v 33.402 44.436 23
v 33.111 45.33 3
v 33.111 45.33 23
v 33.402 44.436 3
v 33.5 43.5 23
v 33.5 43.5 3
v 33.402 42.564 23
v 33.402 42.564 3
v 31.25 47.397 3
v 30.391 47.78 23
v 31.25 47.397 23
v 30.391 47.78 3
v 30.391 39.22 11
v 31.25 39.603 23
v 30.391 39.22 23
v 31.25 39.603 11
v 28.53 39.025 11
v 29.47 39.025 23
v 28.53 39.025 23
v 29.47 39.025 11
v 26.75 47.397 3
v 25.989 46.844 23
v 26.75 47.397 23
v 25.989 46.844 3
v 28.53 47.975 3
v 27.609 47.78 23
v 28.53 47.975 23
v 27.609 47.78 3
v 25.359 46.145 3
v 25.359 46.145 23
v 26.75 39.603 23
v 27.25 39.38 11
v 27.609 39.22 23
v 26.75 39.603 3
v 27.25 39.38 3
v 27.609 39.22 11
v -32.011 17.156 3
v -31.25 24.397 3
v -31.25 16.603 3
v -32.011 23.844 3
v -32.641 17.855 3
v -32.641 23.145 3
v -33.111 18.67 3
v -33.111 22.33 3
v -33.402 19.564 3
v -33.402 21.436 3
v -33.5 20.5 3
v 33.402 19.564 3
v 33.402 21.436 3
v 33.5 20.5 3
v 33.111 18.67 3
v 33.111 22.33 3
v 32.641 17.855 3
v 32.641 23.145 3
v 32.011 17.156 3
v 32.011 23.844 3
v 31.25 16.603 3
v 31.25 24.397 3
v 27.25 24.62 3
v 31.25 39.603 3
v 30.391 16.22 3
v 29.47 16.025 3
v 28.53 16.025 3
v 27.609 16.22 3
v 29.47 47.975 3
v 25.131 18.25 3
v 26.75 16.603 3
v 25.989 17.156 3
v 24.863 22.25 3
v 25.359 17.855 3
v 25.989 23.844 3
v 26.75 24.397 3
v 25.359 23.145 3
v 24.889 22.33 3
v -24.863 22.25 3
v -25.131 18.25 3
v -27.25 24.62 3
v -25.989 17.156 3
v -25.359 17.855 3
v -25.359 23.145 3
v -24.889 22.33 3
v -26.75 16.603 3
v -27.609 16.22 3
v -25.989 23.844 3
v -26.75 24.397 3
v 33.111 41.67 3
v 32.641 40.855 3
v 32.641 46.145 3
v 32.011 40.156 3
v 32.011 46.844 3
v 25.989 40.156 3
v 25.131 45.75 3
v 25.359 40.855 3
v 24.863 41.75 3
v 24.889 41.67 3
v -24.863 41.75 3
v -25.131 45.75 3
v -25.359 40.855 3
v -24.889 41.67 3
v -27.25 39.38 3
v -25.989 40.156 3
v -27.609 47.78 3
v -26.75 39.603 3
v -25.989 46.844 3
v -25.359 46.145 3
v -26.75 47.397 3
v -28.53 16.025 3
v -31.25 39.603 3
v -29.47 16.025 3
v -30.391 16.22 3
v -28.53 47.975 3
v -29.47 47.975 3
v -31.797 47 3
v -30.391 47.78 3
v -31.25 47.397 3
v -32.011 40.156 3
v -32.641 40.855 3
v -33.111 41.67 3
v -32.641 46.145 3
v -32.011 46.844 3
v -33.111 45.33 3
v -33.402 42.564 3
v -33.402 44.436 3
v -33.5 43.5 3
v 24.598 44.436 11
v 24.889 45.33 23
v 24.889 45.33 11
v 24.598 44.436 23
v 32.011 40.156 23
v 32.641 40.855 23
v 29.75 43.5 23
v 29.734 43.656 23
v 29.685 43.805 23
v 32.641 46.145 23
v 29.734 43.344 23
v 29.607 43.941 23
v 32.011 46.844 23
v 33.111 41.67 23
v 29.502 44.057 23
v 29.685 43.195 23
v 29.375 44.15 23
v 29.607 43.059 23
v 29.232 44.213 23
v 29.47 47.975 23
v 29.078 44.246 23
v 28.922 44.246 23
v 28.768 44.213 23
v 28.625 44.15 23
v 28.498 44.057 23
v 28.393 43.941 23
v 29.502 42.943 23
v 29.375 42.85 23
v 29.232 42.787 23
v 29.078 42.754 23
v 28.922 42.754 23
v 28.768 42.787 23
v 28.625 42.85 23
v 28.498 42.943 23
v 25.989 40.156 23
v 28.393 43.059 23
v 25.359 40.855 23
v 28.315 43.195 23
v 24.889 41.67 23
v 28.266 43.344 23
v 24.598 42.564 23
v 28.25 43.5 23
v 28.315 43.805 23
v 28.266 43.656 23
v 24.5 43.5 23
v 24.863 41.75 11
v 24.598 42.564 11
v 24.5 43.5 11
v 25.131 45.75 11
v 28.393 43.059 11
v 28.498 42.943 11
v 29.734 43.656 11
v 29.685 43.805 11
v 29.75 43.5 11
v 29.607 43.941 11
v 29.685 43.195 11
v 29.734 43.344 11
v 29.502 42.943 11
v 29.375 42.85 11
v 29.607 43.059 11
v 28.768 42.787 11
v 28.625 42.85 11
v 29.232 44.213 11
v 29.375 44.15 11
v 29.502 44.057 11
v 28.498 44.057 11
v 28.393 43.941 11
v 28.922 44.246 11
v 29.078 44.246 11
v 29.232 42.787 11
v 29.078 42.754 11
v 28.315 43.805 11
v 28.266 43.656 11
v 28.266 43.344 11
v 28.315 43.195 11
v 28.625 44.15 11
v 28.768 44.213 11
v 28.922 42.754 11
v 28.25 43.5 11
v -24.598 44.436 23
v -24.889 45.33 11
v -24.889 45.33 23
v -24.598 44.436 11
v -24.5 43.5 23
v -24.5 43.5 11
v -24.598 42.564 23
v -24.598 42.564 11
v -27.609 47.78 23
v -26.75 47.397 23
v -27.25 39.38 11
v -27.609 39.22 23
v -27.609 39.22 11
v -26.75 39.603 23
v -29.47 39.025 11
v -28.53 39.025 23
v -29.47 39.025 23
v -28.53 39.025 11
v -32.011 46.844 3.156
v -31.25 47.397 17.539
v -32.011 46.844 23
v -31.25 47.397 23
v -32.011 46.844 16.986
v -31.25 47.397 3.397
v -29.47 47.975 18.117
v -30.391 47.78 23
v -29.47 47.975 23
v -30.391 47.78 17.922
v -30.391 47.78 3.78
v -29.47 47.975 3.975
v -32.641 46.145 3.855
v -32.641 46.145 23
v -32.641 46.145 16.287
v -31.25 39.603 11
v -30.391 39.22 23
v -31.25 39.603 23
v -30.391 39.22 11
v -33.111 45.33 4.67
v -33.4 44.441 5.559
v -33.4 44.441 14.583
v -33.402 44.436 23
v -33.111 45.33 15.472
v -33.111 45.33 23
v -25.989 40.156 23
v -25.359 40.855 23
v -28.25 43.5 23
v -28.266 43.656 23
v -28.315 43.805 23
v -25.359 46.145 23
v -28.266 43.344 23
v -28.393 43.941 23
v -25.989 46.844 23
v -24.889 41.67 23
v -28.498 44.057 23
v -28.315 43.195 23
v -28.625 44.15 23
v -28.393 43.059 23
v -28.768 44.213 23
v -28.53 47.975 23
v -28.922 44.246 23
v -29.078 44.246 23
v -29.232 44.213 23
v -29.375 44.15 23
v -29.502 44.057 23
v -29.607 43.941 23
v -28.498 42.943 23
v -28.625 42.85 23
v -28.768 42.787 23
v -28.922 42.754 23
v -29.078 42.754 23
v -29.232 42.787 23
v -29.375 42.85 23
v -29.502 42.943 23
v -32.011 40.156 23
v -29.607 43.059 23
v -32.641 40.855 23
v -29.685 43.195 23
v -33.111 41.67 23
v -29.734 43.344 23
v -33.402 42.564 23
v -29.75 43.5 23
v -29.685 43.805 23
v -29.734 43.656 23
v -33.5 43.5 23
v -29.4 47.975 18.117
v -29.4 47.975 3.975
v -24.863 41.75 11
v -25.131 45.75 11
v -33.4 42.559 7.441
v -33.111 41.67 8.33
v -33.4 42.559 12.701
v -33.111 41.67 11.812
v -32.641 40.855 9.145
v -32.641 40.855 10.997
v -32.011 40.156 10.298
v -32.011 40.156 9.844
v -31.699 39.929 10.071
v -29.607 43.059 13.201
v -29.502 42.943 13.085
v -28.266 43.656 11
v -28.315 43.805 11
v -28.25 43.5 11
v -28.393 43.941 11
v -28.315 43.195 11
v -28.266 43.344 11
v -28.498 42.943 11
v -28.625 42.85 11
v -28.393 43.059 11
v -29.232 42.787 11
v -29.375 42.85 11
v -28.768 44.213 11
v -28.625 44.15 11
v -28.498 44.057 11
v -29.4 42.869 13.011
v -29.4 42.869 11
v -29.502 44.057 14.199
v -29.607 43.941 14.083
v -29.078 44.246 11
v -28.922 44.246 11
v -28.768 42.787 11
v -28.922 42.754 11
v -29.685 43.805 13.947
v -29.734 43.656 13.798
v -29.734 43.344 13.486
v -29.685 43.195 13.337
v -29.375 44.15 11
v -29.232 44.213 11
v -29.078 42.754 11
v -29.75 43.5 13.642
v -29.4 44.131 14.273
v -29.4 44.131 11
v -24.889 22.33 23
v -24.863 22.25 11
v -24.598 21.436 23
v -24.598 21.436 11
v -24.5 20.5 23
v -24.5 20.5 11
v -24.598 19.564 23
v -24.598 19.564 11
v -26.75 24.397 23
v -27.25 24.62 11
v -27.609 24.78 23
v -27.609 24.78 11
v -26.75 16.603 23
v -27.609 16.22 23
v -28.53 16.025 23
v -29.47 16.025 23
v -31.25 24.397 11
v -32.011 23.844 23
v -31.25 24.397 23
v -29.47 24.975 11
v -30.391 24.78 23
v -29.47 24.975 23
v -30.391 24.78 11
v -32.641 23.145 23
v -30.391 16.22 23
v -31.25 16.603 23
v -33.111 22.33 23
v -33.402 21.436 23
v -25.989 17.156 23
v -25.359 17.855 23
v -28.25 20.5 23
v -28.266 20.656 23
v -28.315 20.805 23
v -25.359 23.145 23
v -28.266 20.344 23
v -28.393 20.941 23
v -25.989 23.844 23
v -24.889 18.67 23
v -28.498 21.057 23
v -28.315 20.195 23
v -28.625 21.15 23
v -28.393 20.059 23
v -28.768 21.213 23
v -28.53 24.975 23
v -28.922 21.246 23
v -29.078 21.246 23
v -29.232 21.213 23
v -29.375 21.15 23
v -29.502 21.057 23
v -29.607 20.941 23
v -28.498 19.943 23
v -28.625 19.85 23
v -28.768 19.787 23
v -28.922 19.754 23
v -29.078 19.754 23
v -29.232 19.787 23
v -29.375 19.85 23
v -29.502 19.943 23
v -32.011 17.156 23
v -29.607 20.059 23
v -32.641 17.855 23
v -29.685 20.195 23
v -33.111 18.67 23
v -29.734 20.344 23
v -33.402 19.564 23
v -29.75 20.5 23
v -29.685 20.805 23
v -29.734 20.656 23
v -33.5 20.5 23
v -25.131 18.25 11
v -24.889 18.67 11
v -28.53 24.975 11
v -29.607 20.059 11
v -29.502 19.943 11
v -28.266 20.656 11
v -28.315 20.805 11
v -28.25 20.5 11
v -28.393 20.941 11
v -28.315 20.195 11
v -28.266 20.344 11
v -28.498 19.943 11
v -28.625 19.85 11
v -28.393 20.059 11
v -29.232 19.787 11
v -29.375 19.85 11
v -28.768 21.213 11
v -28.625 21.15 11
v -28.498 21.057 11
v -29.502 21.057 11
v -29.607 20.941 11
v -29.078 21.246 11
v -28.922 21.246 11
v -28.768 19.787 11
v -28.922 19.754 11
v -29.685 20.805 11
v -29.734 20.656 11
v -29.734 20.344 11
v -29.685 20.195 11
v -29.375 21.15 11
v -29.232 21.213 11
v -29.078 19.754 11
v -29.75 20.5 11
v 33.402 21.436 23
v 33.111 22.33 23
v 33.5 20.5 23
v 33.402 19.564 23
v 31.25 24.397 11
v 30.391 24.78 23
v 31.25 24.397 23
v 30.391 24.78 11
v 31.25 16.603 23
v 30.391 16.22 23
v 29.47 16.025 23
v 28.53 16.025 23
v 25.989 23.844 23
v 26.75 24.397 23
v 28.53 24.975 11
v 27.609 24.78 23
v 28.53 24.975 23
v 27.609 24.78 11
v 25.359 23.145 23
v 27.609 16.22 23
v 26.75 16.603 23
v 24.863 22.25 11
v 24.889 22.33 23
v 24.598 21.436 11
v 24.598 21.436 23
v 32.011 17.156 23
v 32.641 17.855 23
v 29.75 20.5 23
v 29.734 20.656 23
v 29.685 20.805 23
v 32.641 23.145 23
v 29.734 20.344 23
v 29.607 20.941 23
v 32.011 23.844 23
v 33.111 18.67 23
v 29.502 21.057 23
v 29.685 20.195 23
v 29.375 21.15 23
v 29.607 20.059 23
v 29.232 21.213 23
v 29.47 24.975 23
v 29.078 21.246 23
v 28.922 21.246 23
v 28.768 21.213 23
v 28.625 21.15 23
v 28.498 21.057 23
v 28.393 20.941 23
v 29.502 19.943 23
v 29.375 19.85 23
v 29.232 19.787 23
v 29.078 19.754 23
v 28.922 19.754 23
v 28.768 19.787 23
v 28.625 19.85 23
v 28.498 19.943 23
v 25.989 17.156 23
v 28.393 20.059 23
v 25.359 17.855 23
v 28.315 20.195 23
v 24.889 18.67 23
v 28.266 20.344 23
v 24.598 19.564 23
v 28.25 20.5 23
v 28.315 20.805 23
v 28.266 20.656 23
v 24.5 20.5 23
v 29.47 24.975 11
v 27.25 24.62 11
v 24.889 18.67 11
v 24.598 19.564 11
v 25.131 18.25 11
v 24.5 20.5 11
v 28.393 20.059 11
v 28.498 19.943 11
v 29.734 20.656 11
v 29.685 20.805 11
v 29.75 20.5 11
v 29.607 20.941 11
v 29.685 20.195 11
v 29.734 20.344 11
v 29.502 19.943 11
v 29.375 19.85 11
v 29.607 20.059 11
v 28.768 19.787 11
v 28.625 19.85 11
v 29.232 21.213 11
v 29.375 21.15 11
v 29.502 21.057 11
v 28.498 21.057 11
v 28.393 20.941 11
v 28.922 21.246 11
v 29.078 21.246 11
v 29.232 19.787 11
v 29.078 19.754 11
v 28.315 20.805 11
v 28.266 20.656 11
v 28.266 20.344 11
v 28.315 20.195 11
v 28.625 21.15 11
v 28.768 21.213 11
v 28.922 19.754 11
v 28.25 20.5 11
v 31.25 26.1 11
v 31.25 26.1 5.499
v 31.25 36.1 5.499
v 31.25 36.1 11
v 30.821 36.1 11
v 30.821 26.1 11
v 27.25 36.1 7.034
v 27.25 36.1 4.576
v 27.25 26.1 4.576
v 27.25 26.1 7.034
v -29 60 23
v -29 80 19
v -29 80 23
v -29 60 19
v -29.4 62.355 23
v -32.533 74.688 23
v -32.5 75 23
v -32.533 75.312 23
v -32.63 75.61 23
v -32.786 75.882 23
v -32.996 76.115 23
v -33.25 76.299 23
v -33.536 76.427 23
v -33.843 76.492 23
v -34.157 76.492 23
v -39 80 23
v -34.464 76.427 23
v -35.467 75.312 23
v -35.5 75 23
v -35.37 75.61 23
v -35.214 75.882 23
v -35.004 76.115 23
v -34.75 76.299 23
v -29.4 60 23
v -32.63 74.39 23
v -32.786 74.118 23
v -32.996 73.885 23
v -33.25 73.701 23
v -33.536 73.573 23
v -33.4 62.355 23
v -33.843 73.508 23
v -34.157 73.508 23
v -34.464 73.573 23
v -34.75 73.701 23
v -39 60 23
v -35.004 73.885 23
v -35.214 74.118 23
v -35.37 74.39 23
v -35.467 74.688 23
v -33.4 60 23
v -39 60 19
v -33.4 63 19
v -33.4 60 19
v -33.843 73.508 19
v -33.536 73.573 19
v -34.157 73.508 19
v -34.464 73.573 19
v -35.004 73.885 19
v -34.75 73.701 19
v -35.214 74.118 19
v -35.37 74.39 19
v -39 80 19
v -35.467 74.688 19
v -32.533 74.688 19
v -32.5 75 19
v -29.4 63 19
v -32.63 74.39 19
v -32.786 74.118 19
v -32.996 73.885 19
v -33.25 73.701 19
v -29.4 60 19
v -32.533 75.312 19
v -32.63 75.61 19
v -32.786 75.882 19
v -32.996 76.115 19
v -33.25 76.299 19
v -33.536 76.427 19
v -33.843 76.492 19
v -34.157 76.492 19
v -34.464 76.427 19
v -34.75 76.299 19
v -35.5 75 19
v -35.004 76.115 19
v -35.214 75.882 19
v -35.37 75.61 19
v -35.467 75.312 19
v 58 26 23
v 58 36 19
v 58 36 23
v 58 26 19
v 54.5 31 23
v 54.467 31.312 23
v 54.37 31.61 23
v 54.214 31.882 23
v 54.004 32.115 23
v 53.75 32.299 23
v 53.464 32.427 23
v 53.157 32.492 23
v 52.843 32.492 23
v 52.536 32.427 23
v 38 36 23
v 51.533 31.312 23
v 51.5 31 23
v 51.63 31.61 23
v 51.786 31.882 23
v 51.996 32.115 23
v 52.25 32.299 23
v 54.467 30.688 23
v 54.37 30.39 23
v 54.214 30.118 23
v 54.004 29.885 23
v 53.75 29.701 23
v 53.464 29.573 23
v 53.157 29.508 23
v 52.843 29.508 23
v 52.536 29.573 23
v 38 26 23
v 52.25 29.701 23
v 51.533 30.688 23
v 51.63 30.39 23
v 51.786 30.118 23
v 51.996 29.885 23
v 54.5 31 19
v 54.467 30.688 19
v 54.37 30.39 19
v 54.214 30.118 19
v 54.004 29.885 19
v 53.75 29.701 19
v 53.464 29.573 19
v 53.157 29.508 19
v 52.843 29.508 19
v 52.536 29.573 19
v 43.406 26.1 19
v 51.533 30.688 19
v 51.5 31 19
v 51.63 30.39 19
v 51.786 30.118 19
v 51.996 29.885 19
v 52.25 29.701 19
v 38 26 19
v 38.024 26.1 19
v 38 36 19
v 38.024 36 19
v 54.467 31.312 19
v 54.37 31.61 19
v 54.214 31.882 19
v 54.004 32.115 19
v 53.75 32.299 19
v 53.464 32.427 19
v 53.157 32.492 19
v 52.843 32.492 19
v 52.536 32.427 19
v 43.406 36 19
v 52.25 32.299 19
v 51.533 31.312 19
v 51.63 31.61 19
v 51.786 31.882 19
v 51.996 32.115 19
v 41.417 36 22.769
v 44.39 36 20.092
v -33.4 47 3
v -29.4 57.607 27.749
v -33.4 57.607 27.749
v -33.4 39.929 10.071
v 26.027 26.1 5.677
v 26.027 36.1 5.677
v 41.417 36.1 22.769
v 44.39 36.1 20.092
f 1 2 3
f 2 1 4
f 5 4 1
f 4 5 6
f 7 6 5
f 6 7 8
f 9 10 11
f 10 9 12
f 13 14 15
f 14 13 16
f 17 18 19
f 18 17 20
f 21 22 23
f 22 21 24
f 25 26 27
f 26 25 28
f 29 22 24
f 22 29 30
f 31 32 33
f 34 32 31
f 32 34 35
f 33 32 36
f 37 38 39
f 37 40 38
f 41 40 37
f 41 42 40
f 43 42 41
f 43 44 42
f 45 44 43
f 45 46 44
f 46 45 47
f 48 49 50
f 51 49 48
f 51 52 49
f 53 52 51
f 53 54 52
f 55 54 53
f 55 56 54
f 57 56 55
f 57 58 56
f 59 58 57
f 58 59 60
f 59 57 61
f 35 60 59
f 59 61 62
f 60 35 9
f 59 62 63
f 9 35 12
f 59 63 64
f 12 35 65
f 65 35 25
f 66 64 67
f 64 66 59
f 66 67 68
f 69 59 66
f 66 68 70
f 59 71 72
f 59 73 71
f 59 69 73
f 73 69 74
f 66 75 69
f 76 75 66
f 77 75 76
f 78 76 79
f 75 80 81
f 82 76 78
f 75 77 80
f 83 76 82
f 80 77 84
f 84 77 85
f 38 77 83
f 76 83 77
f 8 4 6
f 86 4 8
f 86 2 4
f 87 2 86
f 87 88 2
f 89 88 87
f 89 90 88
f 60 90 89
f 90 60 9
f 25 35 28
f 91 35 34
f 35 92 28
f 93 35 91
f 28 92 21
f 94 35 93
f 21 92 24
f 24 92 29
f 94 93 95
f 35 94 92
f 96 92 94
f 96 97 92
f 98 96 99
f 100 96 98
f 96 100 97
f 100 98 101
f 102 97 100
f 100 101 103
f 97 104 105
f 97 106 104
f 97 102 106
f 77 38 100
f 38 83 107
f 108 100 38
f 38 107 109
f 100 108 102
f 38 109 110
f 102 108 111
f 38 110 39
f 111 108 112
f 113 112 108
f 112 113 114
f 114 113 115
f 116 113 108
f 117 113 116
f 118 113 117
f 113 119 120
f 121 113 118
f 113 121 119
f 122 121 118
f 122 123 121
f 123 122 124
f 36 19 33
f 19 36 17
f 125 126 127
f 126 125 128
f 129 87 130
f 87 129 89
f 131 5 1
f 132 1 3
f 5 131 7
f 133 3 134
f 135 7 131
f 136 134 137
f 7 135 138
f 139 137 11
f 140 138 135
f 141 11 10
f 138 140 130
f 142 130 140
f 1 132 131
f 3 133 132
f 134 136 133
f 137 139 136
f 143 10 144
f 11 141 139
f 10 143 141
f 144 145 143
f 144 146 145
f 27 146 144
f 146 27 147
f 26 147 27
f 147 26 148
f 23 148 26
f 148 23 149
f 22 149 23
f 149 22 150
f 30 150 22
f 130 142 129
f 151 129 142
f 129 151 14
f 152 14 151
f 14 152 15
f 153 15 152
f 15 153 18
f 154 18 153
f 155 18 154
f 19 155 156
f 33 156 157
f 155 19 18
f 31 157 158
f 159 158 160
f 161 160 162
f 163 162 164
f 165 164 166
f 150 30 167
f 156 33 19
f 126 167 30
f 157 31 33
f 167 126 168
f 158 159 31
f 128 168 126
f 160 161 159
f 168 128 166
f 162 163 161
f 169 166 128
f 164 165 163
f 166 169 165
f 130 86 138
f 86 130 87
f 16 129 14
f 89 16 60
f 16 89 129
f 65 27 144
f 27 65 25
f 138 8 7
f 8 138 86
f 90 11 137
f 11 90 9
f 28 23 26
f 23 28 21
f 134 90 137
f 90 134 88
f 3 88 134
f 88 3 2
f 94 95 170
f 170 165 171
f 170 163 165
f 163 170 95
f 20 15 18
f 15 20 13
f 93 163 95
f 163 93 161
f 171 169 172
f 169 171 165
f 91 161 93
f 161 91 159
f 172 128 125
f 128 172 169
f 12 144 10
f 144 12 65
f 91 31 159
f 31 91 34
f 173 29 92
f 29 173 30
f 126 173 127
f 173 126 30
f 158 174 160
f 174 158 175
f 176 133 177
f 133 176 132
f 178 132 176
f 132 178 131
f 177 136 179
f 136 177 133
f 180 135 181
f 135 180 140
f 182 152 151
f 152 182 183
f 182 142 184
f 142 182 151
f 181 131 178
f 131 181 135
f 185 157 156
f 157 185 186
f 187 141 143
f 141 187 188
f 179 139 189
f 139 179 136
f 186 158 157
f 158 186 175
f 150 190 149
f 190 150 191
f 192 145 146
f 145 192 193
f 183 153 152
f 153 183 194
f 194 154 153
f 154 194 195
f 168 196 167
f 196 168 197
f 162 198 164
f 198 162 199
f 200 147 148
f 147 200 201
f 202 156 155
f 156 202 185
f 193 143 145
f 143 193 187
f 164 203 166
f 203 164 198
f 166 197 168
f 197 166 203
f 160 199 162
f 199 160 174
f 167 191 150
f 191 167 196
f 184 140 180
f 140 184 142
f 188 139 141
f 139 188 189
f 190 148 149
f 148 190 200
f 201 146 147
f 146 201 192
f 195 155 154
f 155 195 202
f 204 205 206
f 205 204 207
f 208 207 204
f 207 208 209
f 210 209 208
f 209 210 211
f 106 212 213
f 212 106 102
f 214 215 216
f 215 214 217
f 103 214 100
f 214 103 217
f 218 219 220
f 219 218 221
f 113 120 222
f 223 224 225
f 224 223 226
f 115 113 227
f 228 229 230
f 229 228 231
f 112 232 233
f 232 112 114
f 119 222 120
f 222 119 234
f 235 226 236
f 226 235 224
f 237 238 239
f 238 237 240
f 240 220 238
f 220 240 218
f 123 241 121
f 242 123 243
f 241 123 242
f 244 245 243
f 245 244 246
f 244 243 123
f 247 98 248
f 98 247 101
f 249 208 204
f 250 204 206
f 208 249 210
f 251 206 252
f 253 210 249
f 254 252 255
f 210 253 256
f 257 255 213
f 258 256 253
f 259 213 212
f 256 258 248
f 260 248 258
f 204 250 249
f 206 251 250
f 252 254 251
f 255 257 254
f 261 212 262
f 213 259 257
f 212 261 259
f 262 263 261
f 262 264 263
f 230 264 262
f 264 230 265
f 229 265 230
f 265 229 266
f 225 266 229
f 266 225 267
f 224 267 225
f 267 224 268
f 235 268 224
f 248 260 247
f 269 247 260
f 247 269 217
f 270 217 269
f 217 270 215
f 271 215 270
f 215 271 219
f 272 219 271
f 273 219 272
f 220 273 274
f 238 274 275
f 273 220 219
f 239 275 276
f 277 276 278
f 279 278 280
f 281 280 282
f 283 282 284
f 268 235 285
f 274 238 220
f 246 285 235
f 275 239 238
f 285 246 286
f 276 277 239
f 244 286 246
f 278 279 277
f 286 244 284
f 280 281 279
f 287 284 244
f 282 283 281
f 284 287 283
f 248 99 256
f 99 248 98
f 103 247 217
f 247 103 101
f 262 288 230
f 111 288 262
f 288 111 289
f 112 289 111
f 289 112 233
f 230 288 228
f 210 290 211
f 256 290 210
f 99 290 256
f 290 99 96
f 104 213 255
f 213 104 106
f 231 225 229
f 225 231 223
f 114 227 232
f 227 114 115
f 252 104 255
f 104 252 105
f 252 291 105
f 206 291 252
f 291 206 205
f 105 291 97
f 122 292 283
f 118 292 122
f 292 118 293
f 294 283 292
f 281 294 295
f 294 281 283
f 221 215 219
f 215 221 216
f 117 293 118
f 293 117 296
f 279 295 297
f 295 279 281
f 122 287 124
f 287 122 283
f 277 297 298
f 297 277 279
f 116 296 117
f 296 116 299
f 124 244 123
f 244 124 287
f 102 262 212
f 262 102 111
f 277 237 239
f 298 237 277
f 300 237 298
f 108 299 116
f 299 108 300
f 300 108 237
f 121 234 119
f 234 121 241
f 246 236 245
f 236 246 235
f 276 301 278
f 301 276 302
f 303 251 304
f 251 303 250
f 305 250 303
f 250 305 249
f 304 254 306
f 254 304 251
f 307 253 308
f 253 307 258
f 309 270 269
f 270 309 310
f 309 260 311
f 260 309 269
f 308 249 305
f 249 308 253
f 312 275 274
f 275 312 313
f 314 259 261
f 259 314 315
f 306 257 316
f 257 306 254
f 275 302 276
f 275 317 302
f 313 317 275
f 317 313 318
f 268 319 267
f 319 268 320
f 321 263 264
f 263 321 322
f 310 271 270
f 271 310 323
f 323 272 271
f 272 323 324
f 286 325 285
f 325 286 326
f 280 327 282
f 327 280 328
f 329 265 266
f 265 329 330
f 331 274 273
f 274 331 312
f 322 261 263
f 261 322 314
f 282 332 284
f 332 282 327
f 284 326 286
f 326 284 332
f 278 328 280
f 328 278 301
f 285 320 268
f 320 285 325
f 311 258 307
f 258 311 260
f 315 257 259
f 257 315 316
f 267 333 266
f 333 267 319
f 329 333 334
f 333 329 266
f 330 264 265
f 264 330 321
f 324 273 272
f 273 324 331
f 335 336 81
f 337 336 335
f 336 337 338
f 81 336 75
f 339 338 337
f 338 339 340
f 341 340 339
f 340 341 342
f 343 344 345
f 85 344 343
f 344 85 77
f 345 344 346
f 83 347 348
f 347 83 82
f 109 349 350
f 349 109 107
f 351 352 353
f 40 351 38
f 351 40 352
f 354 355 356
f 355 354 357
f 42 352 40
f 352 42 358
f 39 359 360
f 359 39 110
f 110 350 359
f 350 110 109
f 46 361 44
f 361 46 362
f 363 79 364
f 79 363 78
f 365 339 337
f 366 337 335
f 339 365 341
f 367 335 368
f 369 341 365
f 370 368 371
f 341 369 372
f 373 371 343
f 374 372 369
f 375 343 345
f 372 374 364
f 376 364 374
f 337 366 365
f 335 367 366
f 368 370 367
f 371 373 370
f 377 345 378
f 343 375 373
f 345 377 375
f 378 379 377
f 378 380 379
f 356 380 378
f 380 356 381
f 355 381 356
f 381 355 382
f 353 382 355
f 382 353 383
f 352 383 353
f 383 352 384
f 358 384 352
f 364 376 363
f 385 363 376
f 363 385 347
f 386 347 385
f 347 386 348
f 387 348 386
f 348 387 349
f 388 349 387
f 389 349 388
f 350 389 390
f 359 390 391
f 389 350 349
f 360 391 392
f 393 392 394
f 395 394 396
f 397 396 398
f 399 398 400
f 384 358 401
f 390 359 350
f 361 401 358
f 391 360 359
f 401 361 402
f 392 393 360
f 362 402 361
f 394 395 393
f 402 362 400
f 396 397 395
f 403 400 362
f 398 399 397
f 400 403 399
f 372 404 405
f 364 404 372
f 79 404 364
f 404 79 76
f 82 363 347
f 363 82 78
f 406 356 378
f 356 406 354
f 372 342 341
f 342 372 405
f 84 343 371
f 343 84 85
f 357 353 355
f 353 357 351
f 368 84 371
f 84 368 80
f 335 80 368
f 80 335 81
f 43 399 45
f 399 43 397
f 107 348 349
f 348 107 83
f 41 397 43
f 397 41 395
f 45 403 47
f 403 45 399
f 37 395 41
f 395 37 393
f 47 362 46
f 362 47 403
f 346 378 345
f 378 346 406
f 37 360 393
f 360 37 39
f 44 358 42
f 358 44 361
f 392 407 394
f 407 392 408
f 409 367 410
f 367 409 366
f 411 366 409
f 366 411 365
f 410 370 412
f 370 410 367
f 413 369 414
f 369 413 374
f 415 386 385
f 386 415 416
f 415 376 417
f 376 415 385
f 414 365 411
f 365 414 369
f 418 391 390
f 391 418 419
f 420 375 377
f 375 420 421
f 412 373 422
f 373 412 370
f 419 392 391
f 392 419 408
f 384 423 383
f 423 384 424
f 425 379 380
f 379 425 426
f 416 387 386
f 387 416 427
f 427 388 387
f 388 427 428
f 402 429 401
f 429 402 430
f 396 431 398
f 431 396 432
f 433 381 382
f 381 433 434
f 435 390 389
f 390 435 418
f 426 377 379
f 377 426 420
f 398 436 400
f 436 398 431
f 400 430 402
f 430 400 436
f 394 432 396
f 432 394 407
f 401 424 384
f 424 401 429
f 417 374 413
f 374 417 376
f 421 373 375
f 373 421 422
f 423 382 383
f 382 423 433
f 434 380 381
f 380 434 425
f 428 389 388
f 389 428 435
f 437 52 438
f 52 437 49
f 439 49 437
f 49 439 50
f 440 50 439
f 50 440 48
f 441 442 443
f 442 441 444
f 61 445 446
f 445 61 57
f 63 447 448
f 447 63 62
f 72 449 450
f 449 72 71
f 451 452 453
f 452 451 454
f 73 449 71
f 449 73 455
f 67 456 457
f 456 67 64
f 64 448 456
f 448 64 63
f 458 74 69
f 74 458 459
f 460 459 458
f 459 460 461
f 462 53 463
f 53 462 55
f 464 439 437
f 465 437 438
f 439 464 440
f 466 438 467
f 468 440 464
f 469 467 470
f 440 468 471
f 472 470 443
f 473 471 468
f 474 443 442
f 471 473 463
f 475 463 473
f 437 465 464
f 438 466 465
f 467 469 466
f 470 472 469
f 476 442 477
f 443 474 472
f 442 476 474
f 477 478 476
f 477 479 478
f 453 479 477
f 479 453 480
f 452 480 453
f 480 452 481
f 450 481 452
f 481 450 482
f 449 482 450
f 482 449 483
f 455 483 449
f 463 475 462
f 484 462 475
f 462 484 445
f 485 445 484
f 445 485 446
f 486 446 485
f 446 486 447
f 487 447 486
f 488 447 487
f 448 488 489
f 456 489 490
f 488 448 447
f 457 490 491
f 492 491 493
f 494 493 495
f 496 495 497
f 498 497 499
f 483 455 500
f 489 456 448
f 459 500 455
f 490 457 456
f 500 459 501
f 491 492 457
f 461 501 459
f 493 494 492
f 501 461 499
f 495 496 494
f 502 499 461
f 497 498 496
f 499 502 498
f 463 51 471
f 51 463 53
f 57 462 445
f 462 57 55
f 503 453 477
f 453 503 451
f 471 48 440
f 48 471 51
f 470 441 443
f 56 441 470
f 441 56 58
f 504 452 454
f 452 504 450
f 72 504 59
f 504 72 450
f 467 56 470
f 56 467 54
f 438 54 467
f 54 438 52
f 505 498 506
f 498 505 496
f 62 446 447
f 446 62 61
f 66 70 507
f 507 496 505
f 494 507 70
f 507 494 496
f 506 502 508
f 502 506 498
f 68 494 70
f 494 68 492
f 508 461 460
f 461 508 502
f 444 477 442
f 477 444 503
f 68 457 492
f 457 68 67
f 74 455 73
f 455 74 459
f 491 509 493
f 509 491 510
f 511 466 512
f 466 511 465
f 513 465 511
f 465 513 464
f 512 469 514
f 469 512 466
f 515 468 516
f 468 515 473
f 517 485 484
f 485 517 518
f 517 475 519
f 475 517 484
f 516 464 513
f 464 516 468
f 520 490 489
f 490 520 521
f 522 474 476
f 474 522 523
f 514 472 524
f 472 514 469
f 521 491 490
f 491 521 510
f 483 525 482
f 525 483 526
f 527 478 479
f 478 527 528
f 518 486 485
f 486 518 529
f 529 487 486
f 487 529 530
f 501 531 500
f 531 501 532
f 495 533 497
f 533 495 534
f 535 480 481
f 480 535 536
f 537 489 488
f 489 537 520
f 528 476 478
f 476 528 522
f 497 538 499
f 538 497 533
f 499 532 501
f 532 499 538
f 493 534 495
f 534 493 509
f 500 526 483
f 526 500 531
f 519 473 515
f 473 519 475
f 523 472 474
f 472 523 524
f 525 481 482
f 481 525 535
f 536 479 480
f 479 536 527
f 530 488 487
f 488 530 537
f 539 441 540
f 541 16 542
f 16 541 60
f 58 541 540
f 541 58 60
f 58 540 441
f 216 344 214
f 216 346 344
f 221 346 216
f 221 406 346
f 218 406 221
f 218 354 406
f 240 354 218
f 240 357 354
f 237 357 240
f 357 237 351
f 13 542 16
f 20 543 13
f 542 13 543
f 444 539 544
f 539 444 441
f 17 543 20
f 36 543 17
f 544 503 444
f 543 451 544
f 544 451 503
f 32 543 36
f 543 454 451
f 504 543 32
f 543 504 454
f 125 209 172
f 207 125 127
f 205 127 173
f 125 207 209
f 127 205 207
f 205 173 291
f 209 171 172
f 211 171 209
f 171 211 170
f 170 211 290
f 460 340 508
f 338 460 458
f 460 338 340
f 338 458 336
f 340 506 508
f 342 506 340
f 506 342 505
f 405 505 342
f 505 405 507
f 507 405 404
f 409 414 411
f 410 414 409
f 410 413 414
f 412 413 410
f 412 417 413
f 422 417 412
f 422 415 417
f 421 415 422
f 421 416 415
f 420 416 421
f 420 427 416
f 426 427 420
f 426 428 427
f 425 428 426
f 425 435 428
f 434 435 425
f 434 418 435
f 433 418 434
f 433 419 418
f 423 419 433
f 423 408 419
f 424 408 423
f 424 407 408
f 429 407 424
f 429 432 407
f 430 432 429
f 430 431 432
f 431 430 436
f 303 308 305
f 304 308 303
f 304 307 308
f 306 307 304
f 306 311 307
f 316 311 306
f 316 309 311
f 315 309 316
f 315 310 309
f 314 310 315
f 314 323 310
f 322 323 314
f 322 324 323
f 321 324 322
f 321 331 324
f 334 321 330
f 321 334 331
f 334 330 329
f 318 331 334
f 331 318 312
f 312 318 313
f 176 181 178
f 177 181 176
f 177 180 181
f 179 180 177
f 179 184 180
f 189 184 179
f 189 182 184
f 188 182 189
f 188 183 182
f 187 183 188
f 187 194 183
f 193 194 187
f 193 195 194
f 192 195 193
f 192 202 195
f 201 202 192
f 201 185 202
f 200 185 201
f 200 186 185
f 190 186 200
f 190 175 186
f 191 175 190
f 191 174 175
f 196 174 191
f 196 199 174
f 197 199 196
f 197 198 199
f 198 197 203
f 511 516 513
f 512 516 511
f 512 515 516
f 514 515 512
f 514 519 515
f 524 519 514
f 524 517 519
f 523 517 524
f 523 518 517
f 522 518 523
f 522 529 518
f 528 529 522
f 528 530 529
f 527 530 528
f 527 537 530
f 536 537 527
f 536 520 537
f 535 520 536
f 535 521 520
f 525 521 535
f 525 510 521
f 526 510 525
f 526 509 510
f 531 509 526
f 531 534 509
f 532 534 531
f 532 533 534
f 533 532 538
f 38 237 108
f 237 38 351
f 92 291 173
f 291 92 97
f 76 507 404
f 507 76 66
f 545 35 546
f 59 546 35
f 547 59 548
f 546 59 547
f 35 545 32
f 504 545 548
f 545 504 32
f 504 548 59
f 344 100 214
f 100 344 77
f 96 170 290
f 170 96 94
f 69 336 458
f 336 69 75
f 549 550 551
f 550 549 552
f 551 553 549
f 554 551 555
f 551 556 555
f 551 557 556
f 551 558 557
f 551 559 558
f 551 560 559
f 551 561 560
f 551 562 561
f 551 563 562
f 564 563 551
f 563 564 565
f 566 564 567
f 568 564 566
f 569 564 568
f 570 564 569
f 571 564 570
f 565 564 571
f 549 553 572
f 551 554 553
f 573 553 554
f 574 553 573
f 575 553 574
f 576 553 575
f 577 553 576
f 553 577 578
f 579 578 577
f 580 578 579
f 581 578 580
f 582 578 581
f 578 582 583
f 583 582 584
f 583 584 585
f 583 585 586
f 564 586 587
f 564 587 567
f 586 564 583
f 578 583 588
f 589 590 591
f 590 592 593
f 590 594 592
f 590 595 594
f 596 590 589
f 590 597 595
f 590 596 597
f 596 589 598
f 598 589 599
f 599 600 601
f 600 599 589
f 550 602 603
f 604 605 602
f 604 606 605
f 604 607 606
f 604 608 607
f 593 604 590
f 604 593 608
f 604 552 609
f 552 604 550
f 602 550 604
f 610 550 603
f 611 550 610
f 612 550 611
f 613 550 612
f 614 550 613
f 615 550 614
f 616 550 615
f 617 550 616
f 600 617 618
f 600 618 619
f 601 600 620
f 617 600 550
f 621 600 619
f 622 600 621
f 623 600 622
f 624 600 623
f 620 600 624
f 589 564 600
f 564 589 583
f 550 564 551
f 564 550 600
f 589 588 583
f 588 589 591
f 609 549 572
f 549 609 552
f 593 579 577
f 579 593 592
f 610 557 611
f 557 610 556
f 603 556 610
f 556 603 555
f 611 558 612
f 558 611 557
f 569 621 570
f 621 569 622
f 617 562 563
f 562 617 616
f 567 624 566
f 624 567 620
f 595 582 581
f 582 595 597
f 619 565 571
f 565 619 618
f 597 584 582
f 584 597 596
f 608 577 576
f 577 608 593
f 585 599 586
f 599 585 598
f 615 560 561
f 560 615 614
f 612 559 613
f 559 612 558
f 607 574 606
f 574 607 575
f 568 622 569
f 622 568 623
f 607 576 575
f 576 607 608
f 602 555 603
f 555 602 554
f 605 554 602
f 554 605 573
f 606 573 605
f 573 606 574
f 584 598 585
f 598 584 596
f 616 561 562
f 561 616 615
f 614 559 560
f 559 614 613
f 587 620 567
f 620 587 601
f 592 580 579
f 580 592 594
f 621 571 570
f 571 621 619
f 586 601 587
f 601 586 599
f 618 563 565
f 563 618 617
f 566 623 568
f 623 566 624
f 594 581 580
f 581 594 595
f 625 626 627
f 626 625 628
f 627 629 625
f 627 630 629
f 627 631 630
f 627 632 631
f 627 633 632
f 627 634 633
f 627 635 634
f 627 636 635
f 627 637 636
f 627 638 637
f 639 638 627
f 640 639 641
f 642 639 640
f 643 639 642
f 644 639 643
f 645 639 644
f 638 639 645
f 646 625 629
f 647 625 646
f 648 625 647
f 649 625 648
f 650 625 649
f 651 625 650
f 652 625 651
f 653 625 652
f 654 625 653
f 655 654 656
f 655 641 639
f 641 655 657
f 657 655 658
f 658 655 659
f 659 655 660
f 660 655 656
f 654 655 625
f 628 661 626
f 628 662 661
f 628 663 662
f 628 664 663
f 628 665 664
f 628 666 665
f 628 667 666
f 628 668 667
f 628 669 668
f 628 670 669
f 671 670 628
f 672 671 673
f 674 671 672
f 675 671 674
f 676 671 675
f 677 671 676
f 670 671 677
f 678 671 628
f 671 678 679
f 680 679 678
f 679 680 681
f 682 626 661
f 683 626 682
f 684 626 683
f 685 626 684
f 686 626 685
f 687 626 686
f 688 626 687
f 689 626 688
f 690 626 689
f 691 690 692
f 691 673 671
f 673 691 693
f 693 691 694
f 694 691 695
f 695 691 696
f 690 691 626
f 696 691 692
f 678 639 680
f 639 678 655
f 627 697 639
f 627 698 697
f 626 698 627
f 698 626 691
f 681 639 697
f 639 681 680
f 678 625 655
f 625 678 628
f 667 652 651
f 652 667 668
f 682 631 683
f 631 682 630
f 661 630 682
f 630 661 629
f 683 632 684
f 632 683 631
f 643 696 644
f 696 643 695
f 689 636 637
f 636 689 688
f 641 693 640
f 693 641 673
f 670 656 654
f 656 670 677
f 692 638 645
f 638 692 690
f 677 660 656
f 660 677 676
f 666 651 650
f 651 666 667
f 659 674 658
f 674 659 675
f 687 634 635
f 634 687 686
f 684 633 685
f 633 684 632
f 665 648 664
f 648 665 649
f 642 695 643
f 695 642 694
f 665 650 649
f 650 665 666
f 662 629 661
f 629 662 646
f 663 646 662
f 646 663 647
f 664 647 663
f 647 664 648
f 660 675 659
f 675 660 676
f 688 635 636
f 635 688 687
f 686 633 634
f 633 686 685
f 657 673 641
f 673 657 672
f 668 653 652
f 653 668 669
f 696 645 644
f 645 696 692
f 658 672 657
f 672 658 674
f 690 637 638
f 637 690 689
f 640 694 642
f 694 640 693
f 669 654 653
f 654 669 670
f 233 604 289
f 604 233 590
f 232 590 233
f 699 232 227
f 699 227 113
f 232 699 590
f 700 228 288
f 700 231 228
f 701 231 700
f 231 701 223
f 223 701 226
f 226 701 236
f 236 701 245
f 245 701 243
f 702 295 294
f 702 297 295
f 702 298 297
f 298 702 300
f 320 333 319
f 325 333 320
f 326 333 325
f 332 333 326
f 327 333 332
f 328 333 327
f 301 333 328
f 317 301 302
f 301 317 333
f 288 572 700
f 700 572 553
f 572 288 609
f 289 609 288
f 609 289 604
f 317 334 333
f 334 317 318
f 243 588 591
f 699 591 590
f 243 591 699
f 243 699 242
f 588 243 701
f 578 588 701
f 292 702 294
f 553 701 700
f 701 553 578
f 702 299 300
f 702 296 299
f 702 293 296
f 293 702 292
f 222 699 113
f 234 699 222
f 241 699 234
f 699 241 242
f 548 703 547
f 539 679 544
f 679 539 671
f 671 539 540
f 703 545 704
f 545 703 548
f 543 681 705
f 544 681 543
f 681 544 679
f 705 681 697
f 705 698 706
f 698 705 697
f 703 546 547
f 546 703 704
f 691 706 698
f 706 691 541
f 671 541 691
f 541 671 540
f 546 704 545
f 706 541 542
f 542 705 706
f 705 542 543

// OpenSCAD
// file: PCB_assy_mnt.scad
$fn=30;



RAD = 15/2;
MAIN_LEN = 115;
TOT_WIDTH = 74.5;
RING_HT=10;

ARM_THICKNESS = 8;
FRAME_WD = 8;

//=######################################################################
//SCREW STANCHIONS

SCREWHOLE_WD = 75;
SCREWHOLE_LEN = 87;
screw_x = SCREWHOLE_WD/2;
screw_y = SCREWHOLE_LEN/2;
STANCHION_RAD = 9/2;
STANCHION_HT = 20;
SCREWHOLE_RAD = 1.5/2;

sh_coords = [
    [screw_x, screw_y],
    [-screw_x, screw_y],
    [-screw_x, -screw_y],
    [screw_x, -screw_y],
];

RPI_HOLE_WD = 58;
RPI_HOLE_LN = 23;
rpi_screwhole_x = RPI_HOLE_WD/2;
rpi_screwhole_y = RPI_HOLE_LN/2;

rpi_coords = [
    [rpi_screwhole_x, rpi_screwhole_y],
    [-rpi_screwhole_x, rpi_screwhole_y],
    [-rpi_screwhole_x, -rpi_screwhole_y],
    [rpi_screwhole_x, -rpi_screwhole_y],
];


module stanchion(ht){
    difference(){
        cylinder(h=ht,r=STANCHION_RAD,center=true);
        cylinder(h=ht+3,r=SCREWHOLE_RAD,center=true);

    }
}

module PCB_mount(ht, the_coords){
    translate([0,0,ARM_THICKNESS/2]){
        // the stanchions
        for(coords = the_coords){
            translate([coords[0],coords[1],ht/2-ARM_THICKNESS/2]){ //RAD+ht/2]){
                stanchion(ht);
            }
        }

        translate([0,0,0]){//RAD+(ARM_THICKNESS/2)])
            difference(){
                cube([(the_coords[0][0] * 2) + STANCHION_RAD,
                        (the_coords[0][1] * 2) + STANCHION_RAD,
                        ARM_THICKNESS],
                        center=true);

                cube([(the_coords[0][0] * 2) + STANCHION_RAD - FRAME_WD,
                        (the_coords[0][1] * 2) + STANCHION_RAD - FRAME_WD,
                        ARM_THICKNESS+2],
                        center=true);
            }
        }
    }


    // translate([0,screw_y+7,RAD+(ARM_THICKNESS/2)-1]){
    //     difference(){
    //         cube([15,10,3],center=true);
    //         cylinder(h=5,r=3/2,center=true);
    //     }
    // }

    // translate([0,-screw_y-7,RAD+(ARM_THICKNESS/2)-1]){
    //     difference(){
    //         cube([15,10,3],center=true);
    //         cylinder(h=5,r=3/2,center=true);
    //     }
    // }
}
// main file
include <PCB_assy_mnt.scad>


PCB_LATERAL_OFFSET = 21;
PCB_HOLDER_HT = 3;
PCB_ARM_TN = 4;
PCB_ARM_WD = 10;
PCB_ARM_YPOSI = -15;

SMPCB_LATERAL_OFFSET = 32;



module small_PCB_mount(){
    translate([0, SMPCB_LATERAL_OFFSET, PCB_HOLDER_HT]) {
        // PCB mount
        PCB_mount(STANCHION_HT, rpi_coords);    
        // diagonal connector along short side
        translate([-rpi_coords[0][0] - PCB_ARM_TN*1.1, 15, 0]) {
            rotate(45,[1,0,0]){
                cube([PCB_ARM_TN,25,PCB_ARM_WD]);    
            }
        }
        // flat connector on short side
        translate([-rpi_coords[0][0] - 5, 38, 18]) {
            difference(){
                cube([PCB_ARM_WD, 20, PCB_ARM_TN],center=true);
                translate([0,10-(PCB_ARM_WD/2),-4]){
                    cylinder(r=3/2,h=8);
                }
            }
        }

        // diagonal connector spar along long side
        translate([rpi_coords[0][0],(rpi_coords[0][1] + PCB_ARM_TN*0.4) - 19 , 0]) {
            rotate(-48,[0,1,0]){
                cube([23,PCB_ARM_WD,PCB_ARM_TN]);    
            }
        }
        // flat connector on long side
        translate([rpi_coords[0][0]+19, -1, 18]) {
            difference(){
                cube([20,PCB_ARM_WD,PCB_ARM_TN],center=true);
                translate([10-(PCB_ARM_WD/2),0,-4]){
                    cylinder(r=3/2,h=8);
                }
            }
        }
    }
}


small_PCB_mount();
